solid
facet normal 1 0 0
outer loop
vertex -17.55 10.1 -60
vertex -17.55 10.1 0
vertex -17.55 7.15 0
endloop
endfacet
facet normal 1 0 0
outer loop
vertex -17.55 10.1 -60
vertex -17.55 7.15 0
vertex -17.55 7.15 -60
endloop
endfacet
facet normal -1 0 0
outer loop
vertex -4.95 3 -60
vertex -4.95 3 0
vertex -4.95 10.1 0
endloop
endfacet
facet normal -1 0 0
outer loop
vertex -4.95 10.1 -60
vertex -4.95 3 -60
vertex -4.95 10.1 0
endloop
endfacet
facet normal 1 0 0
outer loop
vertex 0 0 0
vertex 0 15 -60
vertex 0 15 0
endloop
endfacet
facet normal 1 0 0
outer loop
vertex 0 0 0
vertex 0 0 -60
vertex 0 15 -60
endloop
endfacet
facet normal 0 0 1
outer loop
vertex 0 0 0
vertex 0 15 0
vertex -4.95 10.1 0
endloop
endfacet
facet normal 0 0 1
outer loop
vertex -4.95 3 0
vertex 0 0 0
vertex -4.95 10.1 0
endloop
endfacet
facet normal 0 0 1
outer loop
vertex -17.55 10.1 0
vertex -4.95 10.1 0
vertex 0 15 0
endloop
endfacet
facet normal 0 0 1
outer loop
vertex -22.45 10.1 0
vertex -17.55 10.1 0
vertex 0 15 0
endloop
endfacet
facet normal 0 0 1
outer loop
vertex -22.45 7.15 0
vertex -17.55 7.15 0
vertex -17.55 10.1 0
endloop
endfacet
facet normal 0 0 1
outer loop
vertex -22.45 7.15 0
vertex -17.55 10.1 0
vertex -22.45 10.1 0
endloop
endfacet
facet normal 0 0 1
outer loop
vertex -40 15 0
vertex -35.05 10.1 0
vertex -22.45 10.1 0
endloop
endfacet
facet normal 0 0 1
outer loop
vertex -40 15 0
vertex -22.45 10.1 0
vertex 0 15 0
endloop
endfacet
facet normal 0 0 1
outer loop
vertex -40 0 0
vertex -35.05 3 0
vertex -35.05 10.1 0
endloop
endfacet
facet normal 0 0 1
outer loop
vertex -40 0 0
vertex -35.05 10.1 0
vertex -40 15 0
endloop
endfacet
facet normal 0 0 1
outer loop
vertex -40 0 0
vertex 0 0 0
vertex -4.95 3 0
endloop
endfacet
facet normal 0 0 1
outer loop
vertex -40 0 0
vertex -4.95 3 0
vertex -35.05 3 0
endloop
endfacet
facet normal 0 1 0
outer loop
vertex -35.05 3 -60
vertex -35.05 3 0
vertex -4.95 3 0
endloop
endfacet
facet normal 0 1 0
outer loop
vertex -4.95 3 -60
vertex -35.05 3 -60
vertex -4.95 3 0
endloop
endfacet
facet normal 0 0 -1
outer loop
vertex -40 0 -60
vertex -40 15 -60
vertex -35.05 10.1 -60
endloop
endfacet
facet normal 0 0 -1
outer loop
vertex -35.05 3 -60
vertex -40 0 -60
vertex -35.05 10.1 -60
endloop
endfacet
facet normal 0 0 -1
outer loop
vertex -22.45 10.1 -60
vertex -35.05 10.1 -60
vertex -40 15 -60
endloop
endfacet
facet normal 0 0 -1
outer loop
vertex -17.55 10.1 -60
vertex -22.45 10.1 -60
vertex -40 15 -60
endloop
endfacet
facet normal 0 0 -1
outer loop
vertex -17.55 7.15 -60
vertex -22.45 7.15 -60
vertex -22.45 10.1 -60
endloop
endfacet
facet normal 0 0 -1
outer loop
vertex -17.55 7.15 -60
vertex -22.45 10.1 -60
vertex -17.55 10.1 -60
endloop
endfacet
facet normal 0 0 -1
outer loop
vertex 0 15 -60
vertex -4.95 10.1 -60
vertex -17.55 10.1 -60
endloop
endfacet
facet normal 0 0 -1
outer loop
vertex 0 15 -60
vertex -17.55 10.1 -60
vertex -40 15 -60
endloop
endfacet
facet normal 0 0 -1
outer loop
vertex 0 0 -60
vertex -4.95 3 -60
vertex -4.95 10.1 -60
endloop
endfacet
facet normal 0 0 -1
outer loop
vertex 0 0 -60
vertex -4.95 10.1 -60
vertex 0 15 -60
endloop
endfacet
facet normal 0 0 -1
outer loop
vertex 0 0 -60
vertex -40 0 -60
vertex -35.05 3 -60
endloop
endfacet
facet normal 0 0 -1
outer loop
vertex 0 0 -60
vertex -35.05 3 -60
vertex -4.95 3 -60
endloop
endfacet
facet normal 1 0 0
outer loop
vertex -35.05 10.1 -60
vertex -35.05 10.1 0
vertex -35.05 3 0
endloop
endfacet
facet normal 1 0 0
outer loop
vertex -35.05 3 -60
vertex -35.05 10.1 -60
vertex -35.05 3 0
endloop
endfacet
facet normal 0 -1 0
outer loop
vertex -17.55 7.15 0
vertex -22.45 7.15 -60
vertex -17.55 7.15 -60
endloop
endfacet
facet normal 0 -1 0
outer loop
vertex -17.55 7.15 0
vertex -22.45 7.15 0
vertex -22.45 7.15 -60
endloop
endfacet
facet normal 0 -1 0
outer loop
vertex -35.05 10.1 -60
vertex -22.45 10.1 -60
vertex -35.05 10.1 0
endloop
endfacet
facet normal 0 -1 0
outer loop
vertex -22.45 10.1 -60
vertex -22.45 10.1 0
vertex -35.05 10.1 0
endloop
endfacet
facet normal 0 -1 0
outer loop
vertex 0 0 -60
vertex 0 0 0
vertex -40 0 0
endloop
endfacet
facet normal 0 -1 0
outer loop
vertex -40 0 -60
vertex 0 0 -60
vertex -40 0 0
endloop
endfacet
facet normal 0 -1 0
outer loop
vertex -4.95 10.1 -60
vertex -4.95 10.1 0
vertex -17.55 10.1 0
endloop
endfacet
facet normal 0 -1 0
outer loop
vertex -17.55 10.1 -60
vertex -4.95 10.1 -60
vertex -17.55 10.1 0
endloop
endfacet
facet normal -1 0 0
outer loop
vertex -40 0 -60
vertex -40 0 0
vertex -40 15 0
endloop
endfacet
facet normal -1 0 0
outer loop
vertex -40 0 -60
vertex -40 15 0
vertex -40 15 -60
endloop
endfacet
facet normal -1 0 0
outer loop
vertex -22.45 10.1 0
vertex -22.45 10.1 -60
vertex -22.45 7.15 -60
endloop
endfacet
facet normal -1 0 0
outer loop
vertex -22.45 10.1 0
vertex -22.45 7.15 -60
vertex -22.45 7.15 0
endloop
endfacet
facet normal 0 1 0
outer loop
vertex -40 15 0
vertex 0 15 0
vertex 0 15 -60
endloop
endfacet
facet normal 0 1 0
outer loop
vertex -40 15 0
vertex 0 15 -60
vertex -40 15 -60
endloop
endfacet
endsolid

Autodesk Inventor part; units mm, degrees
ref_plane "YZ Plane" through (0, 0, 0) normal (1, 0, 0) x (0, 1, 0)
ref_plane "XZ Plane" through (0, 0, 0) normal (0, 1, 0) x (-1, 0, 0)
ref_plane "XY Plane" through (0, 0, 0) normal (0, 0, 1) x (1, 0, 0)
sketch "スケッチ1" plane through (0, 0, 0) normal (0, 1, 0) x (-1, 0, 0)
  line L0 (0, 0) -> (40, 0)
  line L1 (40, 0) -> (40, -60)
  line L2 (40, -60) -> (0, -60)
  line L3 (0, -60) -> (0, 0)
  dimension "d0" = 40
  dimension "d1" = 60
extrude "押し出し1" add sketch "スケッチ1" along normal blind 15
ref_plane "作業平面1" through (-40, 0, 0) normal (0, 0, 1) x (1, 0, 0)
sketch "スケッチ2" plane through (-40, 0, 0) normal (0, 0, 1) x (1, 0, 0)
  line L0 (40, 15) -> (0, 15) projected
  line L1 (0, 0) -> (40, 0) projected
  line L2 (0, 0) -> (0, 15) projected
  line L3 (40, 0) -> (40, 15) projected
  line L4 (4.95, 3) -> (35.05, 3)
  line L5 (35.05, 3) -> (35.05, 10.1)
  line L6 (35.05, 10.1) -> (4.95, 10.1)
  line L7 (4.95, 10.1) -> (4.95, 3)
  point P0 (20, 10.1)
  dimension "d6" = 15
  dimension "d7" = 40
  dimension "d8" = 30.1
  dimension "d9" = 7.1
  dimension "d10" = 3
extrude "押し出し2" cut sketch "スケッチ2" against normal through all contours L7 L6 L5 L4
ref_plane "作業平面2" through (-35.05, 10.1, -60) normal (0, -1, 0) x (1, 0, 0)
sketch "スケッチ3" plane through (-35.05, 10.1, -60) normal (0, -1, 0) x (1, 0, 0)
  line L0 (-4.95, 60) -> (35.05, 60) projected
  line L1 (12.6, 60) -> (17.5, 60)
  line L2 (17.5, 60) -> (17.5, 0)
  line L3 (17.5, 0) -> (12.6, 0)
  line L4 (12.6, 0) -> (12.6, 60)
  point P0 (15.05, 60)
  dimension "d15" = 60
  dimension "d16" = 4.9
extrude "押し出し3" add sketch "スケッチ3" along normal blind 2.95
properties part number "linia"
